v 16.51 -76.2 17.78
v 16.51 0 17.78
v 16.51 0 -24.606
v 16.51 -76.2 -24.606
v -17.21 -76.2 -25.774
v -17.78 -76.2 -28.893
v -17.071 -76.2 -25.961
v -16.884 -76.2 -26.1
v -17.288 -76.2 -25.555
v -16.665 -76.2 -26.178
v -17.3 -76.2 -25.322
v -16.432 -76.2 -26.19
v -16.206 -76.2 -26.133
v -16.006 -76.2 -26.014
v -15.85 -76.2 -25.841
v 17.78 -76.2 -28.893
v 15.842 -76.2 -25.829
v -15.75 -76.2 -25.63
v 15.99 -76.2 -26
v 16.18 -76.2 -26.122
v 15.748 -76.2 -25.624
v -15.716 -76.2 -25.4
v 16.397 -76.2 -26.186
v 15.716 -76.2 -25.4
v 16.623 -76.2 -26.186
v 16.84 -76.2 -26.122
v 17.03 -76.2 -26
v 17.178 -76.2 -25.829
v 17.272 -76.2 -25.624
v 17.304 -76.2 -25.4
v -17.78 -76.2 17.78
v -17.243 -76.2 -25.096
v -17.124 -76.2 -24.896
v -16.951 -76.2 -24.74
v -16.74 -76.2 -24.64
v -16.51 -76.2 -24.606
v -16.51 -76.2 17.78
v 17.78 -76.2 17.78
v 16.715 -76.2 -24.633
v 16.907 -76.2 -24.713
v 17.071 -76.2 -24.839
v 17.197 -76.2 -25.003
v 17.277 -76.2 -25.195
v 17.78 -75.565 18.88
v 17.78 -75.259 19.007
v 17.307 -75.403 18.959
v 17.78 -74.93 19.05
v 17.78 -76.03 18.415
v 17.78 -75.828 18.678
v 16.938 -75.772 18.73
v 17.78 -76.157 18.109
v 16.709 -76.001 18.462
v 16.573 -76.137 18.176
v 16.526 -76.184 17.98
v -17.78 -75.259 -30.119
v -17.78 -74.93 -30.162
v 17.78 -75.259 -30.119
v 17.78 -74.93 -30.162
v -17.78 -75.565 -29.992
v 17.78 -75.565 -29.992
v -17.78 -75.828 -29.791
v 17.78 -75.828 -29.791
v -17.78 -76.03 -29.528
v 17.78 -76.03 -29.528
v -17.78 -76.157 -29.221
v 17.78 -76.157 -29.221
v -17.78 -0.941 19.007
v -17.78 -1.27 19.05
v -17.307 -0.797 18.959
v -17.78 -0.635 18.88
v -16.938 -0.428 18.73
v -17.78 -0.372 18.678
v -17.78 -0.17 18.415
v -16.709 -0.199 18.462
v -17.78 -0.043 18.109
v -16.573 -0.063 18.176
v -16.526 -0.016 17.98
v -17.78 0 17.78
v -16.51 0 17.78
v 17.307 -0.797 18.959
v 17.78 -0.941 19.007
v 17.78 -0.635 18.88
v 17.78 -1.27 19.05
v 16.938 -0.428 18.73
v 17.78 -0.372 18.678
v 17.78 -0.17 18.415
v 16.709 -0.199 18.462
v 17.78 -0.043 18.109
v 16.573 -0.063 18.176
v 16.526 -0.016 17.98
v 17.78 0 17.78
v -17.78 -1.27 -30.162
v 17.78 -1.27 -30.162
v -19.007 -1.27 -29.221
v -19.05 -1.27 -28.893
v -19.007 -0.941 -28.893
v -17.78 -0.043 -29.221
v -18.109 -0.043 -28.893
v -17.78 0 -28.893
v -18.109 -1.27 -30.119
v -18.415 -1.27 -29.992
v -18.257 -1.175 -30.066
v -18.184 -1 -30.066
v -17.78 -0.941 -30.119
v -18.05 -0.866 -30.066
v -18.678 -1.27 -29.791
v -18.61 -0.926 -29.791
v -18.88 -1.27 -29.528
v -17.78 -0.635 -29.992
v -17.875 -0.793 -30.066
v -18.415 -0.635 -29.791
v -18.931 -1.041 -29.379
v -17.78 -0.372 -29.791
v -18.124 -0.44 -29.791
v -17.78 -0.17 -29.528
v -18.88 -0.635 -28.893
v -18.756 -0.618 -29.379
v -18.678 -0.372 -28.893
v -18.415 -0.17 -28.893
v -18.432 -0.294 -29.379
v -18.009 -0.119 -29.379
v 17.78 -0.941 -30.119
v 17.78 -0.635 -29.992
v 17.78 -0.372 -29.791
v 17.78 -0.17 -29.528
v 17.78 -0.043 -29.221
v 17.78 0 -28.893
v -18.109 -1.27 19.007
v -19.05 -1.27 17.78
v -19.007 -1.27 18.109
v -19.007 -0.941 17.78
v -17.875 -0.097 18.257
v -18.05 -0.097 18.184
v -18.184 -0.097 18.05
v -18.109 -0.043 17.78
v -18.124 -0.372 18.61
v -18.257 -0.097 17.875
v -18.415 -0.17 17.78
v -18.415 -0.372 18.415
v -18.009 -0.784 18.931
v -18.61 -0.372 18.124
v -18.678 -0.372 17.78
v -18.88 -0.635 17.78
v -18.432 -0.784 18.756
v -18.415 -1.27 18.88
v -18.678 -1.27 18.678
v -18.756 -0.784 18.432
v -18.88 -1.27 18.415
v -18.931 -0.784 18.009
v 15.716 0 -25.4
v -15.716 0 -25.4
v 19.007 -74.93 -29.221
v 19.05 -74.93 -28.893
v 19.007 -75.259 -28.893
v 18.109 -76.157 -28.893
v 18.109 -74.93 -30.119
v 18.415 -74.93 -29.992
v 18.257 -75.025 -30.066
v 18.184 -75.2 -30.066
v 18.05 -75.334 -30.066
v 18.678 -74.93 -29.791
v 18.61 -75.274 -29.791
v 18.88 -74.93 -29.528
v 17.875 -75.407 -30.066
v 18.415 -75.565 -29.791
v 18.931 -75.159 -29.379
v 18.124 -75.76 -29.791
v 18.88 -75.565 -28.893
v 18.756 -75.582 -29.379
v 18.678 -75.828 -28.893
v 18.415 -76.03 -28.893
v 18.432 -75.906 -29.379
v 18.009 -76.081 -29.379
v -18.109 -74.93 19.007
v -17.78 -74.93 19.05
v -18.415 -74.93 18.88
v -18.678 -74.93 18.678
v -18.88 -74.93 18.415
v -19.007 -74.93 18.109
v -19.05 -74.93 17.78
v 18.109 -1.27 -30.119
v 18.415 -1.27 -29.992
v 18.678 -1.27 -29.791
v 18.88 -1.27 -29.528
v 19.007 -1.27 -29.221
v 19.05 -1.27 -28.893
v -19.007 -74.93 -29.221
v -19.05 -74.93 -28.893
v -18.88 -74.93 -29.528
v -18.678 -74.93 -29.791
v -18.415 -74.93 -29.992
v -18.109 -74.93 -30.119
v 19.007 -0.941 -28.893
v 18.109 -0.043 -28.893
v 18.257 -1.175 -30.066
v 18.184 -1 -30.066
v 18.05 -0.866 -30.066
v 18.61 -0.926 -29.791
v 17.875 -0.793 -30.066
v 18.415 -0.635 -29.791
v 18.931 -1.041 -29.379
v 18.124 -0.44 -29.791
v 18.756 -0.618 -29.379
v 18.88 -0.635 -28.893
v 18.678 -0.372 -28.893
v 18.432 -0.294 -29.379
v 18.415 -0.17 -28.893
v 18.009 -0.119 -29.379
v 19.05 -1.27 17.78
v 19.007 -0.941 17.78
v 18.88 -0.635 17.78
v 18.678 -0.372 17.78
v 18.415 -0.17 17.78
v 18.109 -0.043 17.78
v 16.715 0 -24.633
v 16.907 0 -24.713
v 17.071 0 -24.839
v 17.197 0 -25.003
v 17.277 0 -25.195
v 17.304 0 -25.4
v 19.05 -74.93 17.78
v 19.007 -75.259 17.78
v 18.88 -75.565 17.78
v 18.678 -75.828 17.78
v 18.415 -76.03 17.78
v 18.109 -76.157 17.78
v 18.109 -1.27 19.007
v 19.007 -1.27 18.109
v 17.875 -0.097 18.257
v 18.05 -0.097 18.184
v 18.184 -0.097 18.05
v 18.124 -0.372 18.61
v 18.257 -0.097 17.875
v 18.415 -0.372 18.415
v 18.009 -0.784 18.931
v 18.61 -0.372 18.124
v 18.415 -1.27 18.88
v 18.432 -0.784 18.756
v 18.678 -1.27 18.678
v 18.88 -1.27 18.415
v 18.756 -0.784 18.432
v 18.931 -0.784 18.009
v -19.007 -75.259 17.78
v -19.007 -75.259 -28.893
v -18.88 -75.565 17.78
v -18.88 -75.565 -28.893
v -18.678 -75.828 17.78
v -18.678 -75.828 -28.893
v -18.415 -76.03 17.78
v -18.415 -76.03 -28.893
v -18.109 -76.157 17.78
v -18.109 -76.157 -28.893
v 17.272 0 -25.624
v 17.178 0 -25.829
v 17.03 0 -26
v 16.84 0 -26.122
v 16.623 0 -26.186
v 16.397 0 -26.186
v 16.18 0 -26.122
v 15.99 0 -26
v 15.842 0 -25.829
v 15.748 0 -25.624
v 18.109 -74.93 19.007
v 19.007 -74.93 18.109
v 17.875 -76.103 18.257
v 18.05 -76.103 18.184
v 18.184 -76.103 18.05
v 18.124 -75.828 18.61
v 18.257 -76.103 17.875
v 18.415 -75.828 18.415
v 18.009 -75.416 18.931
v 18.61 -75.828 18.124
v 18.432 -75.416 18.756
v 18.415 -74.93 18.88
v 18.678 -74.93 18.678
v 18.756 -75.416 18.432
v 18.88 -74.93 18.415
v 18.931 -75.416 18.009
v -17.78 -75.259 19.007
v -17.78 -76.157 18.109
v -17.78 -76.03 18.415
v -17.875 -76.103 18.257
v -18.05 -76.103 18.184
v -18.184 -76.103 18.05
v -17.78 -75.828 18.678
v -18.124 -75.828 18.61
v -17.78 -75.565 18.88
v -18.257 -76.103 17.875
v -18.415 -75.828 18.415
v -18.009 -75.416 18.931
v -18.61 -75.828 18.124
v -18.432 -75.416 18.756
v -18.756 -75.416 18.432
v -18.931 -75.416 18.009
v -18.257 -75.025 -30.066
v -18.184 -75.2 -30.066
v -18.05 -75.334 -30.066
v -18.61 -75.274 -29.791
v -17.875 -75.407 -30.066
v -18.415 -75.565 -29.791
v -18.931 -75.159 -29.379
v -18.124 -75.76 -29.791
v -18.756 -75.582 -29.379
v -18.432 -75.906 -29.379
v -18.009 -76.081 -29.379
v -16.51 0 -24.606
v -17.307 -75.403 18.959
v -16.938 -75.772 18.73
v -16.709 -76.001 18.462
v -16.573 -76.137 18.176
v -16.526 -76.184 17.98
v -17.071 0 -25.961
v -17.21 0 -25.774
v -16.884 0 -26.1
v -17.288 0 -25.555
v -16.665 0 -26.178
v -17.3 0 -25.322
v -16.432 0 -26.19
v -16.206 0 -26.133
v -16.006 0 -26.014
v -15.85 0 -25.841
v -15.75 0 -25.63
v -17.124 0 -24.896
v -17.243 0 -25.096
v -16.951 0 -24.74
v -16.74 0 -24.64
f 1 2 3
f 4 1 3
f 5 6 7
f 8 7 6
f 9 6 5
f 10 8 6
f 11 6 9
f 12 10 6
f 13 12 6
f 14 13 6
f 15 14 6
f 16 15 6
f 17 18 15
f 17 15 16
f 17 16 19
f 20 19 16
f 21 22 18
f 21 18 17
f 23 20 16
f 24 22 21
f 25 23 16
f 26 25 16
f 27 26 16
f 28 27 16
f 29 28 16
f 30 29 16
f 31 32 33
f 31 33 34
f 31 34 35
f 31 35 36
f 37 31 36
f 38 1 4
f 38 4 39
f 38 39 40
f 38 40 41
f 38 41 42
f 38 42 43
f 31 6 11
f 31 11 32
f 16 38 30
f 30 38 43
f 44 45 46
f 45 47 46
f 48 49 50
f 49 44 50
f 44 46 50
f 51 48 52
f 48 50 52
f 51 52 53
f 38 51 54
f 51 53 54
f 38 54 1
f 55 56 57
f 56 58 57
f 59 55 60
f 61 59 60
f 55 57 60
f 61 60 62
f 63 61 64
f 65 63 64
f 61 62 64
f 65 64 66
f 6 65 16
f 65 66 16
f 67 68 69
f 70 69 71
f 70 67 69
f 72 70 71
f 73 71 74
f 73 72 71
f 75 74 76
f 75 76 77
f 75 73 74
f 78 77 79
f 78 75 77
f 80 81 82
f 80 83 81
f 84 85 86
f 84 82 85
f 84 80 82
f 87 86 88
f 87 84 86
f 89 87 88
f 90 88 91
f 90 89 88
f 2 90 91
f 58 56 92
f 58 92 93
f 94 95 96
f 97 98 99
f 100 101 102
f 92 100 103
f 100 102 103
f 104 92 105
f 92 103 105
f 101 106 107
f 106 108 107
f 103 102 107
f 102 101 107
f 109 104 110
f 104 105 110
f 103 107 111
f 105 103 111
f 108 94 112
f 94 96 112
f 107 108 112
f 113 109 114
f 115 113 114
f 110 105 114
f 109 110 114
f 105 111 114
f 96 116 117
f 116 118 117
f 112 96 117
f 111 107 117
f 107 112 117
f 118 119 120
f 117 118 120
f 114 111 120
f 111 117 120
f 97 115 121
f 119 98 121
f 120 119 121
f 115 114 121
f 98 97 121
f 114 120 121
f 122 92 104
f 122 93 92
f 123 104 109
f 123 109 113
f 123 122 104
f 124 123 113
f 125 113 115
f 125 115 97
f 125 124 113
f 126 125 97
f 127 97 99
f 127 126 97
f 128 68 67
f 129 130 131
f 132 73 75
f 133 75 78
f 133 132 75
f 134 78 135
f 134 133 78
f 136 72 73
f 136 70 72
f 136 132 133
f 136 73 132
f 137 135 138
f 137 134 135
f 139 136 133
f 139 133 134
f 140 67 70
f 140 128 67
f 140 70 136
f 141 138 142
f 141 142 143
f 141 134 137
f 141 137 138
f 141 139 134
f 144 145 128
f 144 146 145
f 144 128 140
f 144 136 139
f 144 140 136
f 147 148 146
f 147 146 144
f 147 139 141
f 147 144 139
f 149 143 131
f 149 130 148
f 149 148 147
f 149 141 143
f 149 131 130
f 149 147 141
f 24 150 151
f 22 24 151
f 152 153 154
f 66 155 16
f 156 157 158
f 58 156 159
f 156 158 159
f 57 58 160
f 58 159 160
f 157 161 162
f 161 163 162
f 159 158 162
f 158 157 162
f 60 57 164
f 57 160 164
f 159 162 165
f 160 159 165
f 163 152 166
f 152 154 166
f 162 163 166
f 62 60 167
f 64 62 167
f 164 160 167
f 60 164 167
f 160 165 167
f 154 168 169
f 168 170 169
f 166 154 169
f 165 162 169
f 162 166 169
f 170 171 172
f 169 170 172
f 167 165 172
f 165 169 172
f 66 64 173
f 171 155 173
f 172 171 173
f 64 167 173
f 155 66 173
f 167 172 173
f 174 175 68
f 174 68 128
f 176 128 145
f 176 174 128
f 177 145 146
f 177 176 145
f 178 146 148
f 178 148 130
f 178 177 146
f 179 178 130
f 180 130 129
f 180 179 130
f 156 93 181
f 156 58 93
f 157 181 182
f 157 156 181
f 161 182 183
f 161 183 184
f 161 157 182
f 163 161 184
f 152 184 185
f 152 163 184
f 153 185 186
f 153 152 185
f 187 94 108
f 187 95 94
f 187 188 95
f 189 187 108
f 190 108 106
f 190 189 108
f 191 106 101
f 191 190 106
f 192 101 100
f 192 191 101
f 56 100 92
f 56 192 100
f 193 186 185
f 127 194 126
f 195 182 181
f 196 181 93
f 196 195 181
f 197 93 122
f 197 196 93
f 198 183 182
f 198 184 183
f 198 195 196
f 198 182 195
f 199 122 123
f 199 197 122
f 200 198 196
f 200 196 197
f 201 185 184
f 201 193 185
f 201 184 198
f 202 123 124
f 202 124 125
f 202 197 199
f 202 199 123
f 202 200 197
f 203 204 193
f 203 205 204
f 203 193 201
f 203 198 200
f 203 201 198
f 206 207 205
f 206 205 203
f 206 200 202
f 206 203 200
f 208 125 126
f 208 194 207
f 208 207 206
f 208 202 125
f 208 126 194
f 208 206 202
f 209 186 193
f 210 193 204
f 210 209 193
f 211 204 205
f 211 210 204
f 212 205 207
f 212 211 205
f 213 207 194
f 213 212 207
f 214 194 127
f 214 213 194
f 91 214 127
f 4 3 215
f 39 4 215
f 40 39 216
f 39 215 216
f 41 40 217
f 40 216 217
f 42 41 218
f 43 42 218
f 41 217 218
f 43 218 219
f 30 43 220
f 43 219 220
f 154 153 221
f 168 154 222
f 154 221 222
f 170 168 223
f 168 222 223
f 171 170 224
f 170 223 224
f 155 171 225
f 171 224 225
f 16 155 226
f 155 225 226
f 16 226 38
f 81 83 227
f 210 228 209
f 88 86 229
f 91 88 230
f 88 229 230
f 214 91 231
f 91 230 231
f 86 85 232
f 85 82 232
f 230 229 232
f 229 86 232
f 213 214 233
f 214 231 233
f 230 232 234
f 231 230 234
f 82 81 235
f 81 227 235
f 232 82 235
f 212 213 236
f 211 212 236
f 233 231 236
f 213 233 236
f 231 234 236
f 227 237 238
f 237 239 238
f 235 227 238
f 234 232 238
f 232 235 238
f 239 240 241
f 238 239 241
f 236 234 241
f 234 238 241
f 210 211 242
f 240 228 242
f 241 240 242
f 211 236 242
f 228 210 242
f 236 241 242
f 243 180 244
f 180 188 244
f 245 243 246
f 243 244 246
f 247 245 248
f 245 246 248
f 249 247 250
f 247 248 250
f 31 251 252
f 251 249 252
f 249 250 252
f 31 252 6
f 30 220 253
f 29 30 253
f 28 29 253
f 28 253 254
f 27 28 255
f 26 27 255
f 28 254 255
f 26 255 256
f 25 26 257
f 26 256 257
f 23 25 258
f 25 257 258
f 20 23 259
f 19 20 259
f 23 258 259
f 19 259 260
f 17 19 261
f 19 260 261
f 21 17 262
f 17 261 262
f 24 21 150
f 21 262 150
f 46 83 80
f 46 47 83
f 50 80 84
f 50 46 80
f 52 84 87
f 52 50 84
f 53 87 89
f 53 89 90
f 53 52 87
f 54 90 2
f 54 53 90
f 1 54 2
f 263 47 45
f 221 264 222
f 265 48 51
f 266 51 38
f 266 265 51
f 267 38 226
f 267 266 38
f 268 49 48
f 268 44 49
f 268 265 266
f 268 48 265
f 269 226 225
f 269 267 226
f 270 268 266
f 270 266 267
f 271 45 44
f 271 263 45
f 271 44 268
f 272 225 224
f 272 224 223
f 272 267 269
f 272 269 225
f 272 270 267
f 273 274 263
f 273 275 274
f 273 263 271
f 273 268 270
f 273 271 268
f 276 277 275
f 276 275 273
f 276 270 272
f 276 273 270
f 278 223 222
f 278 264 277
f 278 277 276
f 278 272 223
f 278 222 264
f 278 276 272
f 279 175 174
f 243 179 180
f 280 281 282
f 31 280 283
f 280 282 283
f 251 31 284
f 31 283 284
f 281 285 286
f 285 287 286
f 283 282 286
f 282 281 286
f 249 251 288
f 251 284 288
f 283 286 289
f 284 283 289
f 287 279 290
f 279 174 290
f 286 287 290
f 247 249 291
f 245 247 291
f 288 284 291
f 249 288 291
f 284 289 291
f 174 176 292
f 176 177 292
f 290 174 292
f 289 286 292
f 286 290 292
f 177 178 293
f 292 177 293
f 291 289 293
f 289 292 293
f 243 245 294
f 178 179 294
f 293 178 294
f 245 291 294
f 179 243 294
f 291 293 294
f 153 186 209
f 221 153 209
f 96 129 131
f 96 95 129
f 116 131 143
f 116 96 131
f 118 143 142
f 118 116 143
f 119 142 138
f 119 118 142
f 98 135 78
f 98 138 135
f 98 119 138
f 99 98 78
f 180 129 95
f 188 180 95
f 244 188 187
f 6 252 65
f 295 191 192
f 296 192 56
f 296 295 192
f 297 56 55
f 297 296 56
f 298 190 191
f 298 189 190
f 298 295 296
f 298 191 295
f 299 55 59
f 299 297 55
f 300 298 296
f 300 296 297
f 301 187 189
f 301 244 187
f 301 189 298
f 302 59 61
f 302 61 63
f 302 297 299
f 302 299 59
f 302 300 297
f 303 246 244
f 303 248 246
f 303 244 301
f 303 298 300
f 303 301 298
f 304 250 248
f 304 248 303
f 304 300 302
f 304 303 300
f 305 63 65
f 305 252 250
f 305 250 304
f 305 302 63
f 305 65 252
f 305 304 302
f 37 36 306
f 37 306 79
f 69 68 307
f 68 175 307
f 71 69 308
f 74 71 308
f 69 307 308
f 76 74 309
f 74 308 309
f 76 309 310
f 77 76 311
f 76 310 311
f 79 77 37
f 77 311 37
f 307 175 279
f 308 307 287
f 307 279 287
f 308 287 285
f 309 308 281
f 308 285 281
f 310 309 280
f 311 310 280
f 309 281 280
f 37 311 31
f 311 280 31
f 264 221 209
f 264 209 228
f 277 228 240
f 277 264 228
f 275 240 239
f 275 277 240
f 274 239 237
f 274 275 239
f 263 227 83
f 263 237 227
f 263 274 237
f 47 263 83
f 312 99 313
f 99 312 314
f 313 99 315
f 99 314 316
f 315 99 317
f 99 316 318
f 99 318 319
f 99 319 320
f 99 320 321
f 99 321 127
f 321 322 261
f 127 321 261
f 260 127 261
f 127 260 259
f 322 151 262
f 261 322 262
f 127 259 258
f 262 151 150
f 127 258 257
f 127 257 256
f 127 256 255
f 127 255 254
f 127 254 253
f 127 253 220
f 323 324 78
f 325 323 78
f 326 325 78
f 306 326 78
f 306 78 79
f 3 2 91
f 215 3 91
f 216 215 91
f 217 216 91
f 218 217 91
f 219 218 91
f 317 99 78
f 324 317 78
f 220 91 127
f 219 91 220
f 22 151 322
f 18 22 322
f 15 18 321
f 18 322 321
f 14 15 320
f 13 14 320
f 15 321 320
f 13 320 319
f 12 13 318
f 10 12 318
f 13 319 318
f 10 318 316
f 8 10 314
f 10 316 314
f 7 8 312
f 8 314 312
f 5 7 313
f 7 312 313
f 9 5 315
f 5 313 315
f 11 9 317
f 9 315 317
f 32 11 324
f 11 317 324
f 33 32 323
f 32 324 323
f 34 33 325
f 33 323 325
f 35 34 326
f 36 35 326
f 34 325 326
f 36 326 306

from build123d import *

# Parameters (mm, degrees)
F1_DEPTH = 76.2
F2_R     = 1.26999


# Not quite as in the source:
# - a fillet or chamfer is up to 0.001 mm smaller than in the source, because OpenCascade refuses the exact size


with BuildPart() as f1:
    # F0 (on Front) → F1 (new body)
    with BuildSketch(Plane.XZ):
        with BuildLine():
            Line((-16.51, 19.05), (-19.05, 19.05))
            Line((-19.05, 19.05), (-19.05, -30.1625))
            Line((-19.05, -30.1625), (0, -30.1625))
            Line((0, -30.1625), (0, -25.4))
            Line((0, -25.4), (-15.71625, -25.4))
            ThreePointArc((-15.71625, -25.4), (-17.0712660076, -25.9612660076), (-16.51, -24.60625))
            Line((-16.51, -24.60625), (-16.51, 19.05))
        make_face()
        with BuildLine():
            Line((0, -25.4), (0, -30.1625))
            Line((0, -30.1625), (19.05, -30.1625))
            Line((19.05, -30.1625), (19.05, 19.05))
            Line((19.05, 19.05), (16.51, 19.05))
            Line((16.51, 19.05), (16.51, -24.60625))
            ThreePointArc((16.51, -24.60625), (17.0712660076, -24.8387339924), (17.30375, -25.4))
            ThreePointArc((17.30375, -25.4), (16.51, -26.19375), (15.71625, -25.4))
            Line((15.71625, -25.4), (0, -25.4))
        make_face()
    extrude(amount=F1_DEPTH)

    # F2 (radius 1.27 in the source; OpenCascade refuses exactly that, so slightly less here)
    f2_edges = [f1.edges().sort_by_distance(p)[0] for p in [
        (19.05, -38.1, 19.05),
        (16.51, -38.1, 19.05),
        (17.78, 0, 19.05),
        (17.78, -76.2, 19.05),
        (-16.51, -38.1, 19.05),
        (-19.05, -38.1, 19.05),
        (-17.78, 0, 19.05),
        (-17.78, -76.2, 19.05),
        (-19.05, -76.2, -5.55625),
        (19.05, -76.2, -5.55625),
        (19.05, 0, -5.55625),
        (-19.05, 0, -5.55625),
        (-19.05, -38.1, -30.1625),
        (19.05, -38.1, -30.1625),
        (0, 0, -30.1625),
        (0, -76.2, -30.1625),
    ]]
    fillet(f2_edges, radius=F2_R)


solid = f1.part
